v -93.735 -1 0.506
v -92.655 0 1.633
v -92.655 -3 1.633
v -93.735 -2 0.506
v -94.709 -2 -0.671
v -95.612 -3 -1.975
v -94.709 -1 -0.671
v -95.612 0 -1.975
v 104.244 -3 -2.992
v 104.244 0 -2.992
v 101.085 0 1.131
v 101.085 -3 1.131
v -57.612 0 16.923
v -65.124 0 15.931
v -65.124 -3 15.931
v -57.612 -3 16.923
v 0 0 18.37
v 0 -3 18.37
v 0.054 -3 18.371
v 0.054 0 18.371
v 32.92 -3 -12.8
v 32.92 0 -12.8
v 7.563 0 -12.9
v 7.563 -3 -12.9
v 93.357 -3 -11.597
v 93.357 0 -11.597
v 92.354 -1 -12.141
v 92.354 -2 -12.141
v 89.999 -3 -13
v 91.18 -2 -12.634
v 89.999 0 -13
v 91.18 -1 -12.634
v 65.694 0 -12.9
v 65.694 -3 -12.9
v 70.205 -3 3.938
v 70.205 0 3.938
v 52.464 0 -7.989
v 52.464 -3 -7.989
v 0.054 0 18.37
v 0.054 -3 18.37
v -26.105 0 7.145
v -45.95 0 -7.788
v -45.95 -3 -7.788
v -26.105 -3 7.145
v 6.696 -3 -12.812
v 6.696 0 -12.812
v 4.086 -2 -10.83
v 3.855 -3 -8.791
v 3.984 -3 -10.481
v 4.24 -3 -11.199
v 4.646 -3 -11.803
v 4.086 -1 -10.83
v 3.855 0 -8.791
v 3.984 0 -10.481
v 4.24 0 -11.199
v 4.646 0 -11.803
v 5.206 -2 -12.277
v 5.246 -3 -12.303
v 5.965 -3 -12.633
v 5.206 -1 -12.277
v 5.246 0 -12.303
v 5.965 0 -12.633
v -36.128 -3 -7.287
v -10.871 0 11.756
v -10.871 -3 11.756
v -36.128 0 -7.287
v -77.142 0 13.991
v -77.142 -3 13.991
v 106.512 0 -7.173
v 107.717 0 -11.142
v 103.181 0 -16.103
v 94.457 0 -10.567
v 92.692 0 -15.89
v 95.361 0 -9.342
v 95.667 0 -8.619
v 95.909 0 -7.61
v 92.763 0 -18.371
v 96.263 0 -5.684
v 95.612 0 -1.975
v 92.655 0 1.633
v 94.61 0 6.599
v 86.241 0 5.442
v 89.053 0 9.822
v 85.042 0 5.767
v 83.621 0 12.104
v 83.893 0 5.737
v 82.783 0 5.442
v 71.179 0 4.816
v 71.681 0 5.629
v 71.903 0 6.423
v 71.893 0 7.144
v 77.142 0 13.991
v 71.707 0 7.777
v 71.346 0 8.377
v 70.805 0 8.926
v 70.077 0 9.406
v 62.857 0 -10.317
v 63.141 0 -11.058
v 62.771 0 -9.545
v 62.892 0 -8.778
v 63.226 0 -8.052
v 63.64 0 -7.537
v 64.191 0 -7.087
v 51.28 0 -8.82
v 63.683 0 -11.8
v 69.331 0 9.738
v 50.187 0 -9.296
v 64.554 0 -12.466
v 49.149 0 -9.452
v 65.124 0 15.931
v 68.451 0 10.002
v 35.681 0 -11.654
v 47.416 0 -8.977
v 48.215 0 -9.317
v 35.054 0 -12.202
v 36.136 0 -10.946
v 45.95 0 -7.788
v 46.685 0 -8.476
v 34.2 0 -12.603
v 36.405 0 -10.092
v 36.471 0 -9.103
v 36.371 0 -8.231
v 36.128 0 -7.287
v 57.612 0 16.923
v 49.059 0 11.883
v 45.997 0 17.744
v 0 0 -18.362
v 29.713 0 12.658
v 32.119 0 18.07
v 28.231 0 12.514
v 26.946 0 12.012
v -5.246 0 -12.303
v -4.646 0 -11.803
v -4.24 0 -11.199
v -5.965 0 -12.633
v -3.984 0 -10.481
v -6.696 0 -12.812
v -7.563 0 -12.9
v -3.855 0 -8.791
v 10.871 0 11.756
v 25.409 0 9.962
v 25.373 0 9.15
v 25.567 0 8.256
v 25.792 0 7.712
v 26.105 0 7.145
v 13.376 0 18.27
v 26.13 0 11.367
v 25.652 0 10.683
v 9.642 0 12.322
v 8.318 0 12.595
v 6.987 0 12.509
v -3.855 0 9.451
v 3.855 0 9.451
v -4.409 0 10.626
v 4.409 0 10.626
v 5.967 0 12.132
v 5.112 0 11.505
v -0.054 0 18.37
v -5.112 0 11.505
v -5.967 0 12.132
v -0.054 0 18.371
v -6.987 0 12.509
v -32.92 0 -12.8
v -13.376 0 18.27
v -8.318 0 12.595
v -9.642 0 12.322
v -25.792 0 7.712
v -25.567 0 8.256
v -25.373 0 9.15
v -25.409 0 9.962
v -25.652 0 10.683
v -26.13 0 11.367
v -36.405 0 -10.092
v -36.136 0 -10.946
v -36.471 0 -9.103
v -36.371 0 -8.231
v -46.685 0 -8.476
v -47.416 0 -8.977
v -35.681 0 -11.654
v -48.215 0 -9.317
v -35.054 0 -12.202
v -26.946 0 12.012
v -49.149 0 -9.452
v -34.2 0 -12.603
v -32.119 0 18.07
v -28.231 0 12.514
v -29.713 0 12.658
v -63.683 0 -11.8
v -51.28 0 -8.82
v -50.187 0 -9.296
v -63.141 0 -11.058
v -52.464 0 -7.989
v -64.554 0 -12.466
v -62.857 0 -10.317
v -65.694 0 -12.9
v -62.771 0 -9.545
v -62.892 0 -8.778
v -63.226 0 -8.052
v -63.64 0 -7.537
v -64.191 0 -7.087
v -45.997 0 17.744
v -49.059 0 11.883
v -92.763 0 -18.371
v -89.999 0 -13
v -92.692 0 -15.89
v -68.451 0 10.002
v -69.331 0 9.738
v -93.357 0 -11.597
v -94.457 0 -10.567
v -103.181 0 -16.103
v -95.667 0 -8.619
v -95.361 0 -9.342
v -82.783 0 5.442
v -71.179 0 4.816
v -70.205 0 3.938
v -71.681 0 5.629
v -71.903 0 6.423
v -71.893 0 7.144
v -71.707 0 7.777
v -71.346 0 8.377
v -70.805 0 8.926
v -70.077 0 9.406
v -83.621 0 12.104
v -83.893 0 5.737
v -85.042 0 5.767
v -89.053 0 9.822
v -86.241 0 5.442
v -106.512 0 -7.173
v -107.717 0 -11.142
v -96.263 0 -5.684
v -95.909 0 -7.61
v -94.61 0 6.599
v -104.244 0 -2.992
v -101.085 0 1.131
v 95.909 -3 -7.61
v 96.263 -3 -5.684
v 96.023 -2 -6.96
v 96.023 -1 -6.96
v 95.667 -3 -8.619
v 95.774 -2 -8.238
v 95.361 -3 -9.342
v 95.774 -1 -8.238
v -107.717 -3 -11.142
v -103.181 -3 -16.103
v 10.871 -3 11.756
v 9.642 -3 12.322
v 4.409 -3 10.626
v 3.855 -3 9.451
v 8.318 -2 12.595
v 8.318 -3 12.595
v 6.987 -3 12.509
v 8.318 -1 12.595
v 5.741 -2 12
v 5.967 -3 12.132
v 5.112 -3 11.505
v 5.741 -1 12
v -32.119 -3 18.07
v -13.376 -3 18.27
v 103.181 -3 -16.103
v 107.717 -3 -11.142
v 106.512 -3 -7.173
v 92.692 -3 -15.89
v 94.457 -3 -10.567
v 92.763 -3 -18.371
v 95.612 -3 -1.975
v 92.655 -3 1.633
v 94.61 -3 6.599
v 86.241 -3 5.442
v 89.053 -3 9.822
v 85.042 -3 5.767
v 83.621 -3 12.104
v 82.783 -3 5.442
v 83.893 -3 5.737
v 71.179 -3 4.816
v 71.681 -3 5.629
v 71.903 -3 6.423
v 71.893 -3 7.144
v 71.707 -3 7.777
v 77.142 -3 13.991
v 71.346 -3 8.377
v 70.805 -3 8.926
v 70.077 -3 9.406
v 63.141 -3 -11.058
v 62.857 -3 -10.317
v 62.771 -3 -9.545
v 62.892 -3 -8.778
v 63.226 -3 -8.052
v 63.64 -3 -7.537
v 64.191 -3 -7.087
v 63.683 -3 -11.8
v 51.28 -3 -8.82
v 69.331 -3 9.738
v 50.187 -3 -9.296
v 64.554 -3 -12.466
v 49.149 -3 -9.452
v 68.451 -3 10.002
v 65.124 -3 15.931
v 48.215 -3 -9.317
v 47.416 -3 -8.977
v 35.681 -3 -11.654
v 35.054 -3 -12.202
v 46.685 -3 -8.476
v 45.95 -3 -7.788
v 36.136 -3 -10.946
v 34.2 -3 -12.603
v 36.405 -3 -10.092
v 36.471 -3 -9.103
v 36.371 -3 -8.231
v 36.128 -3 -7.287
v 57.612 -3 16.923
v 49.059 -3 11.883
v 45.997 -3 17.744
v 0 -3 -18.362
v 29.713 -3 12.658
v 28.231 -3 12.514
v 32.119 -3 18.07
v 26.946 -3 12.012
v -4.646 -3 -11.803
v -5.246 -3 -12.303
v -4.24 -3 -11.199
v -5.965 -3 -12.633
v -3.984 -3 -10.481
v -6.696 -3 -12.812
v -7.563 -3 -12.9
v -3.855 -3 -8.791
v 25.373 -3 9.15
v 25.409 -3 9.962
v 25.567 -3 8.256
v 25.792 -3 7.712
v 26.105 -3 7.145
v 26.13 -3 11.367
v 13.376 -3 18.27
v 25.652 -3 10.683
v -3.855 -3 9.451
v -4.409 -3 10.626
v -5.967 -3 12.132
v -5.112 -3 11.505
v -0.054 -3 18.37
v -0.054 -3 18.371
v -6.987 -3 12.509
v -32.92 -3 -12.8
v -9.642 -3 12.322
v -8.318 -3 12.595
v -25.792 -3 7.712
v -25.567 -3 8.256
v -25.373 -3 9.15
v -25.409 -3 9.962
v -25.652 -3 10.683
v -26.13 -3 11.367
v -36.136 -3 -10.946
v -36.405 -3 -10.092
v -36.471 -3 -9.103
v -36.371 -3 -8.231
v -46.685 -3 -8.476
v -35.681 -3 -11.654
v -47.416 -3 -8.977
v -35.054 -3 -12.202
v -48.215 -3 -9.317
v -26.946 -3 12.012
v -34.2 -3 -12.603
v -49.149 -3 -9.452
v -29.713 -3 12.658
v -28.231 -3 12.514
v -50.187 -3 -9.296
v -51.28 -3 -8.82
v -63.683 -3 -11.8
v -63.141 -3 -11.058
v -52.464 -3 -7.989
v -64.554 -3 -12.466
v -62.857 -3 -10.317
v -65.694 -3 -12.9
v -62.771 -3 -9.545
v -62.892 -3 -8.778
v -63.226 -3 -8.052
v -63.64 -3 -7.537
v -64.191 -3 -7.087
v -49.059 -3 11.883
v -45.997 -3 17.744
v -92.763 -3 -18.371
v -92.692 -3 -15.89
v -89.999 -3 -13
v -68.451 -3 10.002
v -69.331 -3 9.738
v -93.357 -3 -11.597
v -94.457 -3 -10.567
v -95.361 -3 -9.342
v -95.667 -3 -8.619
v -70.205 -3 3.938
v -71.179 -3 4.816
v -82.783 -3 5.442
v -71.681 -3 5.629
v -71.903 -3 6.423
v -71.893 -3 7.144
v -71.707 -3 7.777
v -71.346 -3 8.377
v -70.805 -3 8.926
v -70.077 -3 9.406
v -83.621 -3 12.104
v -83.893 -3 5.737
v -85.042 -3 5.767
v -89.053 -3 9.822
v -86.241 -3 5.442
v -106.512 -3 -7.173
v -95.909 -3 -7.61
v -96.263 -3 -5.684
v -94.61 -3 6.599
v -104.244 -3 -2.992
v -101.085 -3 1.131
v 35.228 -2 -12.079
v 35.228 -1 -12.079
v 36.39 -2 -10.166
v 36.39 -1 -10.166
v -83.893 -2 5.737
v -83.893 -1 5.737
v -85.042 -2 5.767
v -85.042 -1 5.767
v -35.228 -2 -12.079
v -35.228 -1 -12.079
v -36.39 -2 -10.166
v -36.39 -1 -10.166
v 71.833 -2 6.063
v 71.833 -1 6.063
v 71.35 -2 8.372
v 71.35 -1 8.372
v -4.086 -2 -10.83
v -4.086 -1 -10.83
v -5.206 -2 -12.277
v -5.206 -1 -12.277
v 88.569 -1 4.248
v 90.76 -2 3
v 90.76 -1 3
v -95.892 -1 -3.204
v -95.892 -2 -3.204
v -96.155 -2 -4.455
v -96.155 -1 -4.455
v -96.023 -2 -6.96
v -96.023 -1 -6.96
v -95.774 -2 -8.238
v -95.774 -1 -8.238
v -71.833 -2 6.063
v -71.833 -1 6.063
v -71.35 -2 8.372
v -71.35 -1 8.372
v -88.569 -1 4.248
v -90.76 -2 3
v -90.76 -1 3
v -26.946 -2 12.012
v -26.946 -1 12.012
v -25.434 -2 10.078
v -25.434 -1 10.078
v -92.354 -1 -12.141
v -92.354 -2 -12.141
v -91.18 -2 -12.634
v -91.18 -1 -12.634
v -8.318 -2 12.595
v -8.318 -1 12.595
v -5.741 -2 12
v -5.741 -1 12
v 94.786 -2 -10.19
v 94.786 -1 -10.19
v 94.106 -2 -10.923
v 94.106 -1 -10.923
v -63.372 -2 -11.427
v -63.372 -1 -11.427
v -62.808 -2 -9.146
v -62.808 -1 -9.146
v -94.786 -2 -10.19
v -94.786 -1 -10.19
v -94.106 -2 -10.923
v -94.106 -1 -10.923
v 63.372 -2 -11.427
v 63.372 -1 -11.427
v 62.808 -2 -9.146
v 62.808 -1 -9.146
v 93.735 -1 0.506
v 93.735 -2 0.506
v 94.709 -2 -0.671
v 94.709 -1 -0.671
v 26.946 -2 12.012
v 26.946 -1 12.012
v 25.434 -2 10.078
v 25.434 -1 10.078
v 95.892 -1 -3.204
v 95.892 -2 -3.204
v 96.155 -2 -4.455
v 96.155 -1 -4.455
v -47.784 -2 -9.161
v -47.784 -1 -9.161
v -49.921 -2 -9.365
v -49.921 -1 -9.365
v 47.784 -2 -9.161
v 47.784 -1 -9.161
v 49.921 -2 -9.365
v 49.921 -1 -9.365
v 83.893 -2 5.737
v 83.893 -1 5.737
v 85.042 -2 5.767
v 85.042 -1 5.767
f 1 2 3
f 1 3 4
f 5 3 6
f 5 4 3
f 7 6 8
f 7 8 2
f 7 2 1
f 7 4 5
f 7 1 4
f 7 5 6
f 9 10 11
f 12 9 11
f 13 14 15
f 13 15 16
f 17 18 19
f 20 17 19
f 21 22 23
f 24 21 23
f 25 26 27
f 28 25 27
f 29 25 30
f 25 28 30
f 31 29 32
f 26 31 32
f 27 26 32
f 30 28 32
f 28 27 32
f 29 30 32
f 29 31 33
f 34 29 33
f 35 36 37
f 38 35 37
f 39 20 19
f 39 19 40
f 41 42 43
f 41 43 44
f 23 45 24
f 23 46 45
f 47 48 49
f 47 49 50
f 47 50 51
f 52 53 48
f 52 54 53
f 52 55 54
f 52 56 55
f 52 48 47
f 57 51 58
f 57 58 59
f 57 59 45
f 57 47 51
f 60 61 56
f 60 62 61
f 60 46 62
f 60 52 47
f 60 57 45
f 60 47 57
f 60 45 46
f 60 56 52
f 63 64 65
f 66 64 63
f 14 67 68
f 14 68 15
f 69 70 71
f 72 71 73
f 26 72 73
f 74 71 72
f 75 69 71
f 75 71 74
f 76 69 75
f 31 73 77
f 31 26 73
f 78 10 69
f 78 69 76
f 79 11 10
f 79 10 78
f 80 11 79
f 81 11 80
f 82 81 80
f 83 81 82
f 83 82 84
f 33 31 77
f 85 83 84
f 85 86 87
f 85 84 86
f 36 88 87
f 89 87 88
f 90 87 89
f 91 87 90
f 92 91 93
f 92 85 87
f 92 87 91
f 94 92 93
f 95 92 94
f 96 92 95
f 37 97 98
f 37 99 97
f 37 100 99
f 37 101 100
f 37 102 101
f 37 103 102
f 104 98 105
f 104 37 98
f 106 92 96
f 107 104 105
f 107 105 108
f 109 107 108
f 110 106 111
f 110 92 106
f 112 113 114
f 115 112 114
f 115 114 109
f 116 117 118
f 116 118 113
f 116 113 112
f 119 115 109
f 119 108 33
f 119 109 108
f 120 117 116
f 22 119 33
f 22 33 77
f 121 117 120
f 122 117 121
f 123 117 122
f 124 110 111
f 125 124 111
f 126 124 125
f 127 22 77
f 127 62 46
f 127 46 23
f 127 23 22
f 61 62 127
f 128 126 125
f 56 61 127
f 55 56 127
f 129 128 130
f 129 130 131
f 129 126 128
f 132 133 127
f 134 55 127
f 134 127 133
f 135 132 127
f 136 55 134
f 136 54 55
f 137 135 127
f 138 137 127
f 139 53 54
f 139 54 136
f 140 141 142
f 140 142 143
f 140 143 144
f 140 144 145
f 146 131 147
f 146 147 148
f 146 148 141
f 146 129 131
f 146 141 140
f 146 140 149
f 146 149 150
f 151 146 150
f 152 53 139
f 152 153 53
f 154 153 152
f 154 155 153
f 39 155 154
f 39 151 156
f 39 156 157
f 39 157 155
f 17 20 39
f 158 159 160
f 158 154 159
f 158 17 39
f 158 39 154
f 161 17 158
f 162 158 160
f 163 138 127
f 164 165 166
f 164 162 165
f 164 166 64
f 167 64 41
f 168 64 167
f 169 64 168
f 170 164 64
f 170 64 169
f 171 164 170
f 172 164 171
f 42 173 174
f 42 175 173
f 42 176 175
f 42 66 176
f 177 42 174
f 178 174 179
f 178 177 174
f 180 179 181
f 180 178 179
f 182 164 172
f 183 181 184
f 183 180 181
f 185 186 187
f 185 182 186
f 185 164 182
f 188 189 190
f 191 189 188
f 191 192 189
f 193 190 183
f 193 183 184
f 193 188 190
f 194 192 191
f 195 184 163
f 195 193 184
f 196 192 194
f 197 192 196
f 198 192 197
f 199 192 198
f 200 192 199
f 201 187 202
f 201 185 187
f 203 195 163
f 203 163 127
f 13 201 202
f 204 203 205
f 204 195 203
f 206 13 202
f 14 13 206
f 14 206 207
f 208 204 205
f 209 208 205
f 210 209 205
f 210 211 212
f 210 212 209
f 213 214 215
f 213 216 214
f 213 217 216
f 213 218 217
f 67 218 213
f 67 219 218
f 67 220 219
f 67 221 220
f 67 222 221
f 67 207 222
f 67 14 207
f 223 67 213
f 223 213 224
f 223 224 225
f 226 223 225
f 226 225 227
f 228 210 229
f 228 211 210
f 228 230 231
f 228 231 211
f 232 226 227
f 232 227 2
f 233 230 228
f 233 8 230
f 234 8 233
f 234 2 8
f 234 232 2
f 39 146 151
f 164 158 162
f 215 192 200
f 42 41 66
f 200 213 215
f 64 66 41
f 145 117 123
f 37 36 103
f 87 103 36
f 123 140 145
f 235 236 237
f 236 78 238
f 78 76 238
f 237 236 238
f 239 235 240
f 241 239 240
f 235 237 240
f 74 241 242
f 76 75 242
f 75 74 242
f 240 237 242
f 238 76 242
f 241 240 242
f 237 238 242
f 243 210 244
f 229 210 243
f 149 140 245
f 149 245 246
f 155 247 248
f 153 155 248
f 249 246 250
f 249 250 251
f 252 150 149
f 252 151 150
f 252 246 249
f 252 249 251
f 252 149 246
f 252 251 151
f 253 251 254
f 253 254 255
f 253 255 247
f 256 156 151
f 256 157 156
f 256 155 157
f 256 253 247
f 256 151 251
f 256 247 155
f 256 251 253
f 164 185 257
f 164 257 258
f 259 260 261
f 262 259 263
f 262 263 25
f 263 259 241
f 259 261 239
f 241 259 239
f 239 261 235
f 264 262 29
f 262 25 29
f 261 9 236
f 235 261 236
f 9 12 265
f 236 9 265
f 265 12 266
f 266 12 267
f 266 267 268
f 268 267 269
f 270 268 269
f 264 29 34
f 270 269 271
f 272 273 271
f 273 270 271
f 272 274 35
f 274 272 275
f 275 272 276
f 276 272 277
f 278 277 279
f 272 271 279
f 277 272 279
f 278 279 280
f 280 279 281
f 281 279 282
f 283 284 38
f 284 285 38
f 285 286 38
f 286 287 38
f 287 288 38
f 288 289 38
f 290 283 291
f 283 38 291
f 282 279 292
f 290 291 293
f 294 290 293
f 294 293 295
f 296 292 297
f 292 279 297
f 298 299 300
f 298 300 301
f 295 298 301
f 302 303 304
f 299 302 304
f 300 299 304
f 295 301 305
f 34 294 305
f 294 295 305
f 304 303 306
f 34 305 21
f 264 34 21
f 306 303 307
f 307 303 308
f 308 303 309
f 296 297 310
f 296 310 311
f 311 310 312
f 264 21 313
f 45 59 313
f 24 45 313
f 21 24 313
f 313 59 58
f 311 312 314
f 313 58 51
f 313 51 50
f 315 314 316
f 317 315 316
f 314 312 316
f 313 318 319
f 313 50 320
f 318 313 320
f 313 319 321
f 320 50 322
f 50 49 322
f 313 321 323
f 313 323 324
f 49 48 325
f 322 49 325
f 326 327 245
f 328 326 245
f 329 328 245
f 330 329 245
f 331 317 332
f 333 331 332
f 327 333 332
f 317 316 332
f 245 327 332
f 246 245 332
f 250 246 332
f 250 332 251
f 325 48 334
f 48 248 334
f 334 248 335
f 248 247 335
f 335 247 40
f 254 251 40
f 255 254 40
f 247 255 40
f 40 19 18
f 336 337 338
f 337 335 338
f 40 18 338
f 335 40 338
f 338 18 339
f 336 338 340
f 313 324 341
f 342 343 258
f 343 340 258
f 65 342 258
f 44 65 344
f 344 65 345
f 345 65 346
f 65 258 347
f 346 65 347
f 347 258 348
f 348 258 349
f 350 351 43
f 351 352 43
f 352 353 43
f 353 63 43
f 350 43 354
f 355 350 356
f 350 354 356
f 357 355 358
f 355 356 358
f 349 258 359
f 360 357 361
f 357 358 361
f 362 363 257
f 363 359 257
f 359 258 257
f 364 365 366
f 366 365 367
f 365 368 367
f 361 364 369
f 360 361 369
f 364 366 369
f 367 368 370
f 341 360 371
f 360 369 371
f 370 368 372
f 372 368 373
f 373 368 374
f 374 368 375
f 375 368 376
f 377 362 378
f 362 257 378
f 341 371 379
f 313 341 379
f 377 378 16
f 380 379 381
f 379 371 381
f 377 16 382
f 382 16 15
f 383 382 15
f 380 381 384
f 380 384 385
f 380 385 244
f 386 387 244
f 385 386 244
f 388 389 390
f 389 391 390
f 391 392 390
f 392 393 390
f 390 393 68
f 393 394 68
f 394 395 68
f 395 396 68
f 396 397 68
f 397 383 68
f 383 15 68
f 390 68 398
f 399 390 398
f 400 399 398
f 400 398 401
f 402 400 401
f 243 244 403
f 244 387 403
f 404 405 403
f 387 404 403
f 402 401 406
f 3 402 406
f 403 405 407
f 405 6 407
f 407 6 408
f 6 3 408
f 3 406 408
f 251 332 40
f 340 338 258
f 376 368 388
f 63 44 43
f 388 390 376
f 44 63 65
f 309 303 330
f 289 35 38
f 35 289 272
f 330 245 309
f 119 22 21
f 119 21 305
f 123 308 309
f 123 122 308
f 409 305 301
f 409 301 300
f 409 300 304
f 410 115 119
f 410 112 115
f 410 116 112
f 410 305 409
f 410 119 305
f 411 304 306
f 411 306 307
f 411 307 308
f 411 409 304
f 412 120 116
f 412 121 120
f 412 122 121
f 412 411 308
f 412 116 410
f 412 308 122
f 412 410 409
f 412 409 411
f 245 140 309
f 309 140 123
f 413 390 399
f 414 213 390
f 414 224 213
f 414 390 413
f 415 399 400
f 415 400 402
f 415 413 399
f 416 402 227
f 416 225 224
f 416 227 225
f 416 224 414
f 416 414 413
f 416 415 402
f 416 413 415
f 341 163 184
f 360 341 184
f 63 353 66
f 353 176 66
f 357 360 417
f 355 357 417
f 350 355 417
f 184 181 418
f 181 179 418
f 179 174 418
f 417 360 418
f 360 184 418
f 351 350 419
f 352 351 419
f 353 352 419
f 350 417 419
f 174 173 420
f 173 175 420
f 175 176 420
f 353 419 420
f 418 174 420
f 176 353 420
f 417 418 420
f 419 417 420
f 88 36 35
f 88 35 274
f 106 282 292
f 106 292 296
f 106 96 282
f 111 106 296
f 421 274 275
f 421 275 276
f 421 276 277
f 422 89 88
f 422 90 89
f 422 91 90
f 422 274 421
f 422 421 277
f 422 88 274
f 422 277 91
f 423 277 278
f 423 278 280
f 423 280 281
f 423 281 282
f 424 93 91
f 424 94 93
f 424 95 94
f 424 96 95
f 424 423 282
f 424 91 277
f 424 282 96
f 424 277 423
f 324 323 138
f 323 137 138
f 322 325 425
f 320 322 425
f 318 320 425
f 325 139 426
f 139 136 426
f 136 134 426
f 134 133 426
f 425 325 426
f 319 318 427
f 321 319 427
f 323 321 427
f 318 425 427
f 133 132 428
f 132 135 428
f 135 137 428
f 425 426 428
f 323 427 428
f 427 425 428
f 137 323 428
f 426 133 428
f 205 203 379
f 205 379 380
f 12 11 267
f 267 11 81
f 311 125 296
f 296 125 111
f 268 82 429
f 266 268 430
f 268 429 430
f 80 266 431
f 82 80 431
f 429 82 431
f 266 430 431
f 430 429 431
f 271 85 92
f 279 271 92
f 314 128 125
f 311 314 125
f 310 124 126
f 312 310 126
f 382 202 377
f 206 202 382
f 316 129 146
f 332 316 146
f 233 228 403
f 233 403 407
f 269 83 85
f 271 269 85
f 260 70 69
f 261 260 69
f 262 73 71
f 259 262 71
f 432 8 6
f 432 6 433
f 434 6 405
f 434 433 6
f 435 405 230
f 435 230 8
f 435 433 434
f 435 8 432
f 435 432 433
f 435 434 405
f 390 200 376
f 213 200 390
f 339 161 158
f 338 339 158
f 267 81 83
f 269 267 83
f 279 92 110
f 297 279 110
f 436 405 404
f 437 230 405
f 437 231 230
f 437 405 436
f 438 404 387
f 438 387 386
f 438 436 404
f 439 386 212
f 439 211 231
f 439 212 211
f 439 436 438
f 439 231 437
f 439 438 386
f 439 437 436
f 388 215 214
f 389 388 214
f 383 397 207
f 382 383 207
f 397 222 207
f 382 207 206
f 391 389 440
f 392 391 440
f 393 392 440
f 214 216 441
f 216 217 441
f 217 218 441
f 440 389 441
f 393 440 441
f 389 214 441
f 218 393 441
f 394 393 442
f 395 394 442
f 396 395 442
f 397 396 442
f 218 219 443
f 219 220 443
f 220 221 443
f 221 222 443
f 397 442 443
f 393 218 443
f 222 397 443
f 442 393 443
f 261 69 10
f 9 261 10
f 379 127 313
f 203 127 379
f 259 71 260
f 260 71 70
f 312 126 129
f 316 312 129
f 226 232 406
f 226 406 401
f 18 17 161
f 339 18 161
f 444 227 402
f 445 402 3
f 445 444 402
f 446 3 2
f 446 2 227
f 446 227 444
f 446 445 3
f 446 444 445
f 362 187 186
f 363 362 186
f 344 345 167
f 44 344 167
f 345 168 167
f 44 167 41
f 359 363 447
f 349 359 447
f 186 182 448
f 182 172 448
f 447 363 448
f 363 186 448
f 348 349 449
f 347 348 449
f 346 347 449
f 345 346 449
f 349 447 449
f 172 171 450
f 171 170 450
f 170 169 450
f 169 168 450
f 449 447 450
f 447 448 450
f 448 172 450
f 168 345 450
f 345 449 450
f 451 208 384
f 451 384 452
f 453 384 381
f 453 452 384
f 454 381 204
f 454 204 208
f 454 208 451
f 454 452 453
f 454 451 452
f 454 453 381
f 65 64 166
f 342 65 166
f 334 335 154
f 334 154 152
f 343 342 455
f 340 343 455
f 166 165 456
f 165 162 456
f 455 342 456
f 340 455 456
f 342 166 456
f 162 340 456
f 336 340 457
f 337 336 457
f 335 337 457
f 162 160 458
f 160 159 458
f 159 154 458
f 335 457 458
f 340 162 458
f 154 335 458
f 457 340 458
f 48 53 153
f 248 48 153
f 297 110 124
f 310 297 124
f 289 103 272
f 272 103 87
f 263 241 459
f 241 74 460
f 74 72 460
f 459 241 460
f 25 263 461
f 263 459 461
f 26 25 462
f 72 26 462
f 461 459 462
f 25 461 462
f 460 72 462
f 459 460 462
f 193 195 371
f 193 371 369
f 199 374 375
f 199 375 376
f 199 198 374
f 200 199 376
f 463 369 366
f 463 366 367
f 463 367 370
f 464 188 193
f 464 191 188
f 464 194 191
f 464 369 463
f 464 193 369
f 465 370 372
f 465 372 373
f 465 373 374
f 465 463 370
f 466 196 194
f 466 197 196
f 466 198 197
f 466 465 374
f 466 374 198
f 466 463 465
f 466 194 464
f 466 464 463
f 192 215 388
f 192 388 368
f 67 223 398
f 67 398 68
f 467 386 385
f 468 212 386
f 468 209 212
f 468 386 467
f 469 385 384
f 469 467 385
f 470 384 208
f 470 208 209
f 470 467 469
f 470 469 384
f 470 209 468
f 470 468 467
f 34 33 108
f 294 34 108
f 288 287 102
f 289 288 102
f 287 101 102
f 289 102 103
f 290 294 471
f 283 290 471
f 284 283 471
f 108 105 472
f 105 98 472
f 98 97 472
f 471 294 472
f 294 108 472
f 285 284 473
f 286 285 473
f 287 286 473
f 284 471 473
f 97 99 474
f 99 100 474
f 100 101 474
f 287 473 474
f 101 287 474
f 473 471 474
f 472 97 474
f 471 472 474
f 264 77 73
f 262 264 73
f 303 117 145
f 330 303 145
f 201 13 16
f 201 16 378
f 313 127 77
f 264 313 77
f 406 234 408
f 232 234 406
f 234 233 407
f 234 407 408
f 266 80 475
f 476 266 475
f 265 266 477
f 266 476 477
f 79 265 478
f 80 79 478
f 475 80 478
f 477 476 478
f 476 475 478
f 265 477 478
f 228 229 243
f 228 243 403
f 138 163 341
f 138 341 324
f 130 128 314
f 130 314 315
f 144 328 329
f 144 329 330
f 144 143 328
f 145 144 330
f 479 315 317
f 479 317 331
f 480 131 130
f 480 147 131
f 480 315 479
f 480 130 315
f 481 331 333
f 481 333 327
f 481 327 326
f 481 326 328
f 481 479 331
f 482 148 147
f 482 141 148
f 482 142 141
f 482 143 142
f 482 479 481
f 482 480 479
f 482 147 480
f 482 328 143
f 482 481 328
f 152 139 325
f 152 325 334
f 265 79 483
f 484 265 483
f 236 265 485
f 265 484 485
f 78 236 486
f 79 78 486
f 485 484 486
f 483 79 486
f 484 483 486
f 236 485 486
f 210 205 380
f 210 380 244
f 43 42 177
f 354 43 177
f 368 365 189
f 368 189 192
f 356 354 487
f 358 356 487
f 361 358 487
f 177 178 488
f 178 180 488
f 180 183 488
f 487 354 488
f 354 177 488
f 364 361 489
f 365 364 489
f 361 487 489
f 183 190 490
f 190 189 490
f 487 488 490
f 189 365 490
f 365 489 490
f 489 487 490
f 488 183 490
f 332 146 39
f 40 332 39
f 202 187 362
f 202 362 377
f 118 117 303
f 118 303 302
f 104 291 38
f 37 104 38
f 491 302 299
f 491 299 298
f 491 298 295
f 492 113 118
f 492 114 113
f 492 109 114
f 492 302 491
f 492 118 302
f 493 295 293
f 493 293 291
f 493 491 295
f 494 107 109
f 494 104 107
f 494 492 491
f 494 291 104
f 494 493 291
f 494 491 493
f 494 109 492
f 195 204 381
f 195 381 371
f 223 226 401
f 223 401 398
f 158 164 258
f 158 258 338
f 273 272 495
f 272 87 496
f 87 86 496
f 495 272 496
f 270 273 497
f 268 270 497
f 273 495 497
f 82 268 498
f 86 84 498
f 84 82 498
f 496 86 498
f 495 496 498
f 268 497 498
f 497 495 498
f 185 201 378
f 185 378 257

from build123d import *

# Parameters (mm, degrees)
F1_DEPTH = 3


# Not quite as in the source:
# - ends of sketch curves that miss each other by under 0.0002 mm in the source are joined


with BuildPart() as f1:
    # F0 (on Front) → F1 (new body)
    with BuildSketch(Plane.XZ):
        Polygon((-0.0539638903, 18.370702), (-0.0038508903, -18.362152), (92.7633391097, -18.370702), (92.6924631097, -15.890233), (103.1813041097, -16.102845), (107.7170111097, -11.141907), (106.5122111097, -7.173158), (104.2443611097, -2.991796), (101.0845361097, 1.130854), (94.6101381097, 6.599435), (89.0528781097, 9.821526), (83.6210411097, 12.103627), (77.1418581097, 13.991338), (65.1238321097, 15.930635), (57.6115531097, 16.922822), (45.9973841097, 17.743913), (32.1186031097, 18.070024), (13.3763291097, 18.270477), align=None)
        with BuildLine():
            add(Edge.make_bspline(
                [(65.6943371097, -12.899831), (62.5550341097, -12.172951), (61.7713101097, -8.692501), (64.1909471097, -7.08672)],
                knots=[0, 0, 0, 0, 1, 1, 1, 1], degree=3))
            Line((64.1909471097, -7.08672), (82.7828791097, 5.441539))
            add(Edge.make_bspline(
                [(82.7828791097, 5.441539), (83.8783131097, 5.841711), (85.0121781097, 5.972881), (86.2406861097, 5.441541)],
                knots=[0, 0, 0, 0, 1, 1, 1, 1], degree=3))
            add(Edge.make_bspline(
                [(86.2406861097, 5.441541), (88.5854111097, 4.25464), (90.9595961097, 3.079519), (92.6551511097, 1.632949)],
                knots=[0, 0, 0, 0, 1, 1, 1, 1], degree=3))
            add(Edge.make_bspline(
                [(92.6551511097, 1.632949), (93.7989981097, 0.505006), (94.7332961097, -0.581922), (95.6118231097, -1.97519)],
                knots=[0, 0, 0, 0, 1, 1, 1, 1], degree=3))
            add(Edge.make_bspline(
                [(95.6118231097, -1.97519), (95.8557461097, -3.177903), (96.2772981097, -4.480841), (96.2632881097, -5.683554)],
                knots=[0, 0, 0, 0, 1, 1, 1, 1], degree=3))
            add(Edge.make_bspline(
                [(96.2632881097, -5.683554), (95.9762411097, -6.899896), (95.9073311097, -8.384491), (95.3612561097, -9.341805)],
                knots=[0, 0, 0, 0, 1, 1, 1, 1], degree=3))
            add(Edge.make_bspline(
                [(95.3612561097, -9.341805), (94.8500481097, -10.267174), (94.1296281097, -10.933218), (93.3567311097, -11.596892)],
                knots=[0, 0, 0, 0, 1, 1, 1, 1], degree=3))
            add(Edge.make_bspline(
                [(93.3567311097, -11.596892), (92.4958131097, -12.139141), (91.1271531097, -12.72489), (89.9991611097, -13.000059)],
                knots=[0, 0, 0, 0, 1, 1, 1, 1], degree=3))
            Line((89.9991611097, -13.000059), (65.6943371097, -12.899831))
        make_face(mode=Mode.SUBTRACT)
        with BuildLine():
            Line((3.8548531097, -8.790562), (3.8548531097, 9.450582))
            add(Edge.make_bspline(
                [(10.8706771097, 11.755782), (8.5680291097, 13.13931), (5.1563371097, 13.150107), (3.8548531097, 9.450582)],
                knots=[0, 0, 0, 0, 1, 1, 1, 1], degree=3))
            Line((10.8706771097, 11.755782), (36.1276481097, -7.28717))
            add(Edge.make_bspline(
                [(32.9204121097, -12.799606), (35.7071221097, -12.751328), (37.1961481097, -10.572453), (36.1276481097, -7.28717)],
                knots=[0, 0, 0, 0, 1, 1, 1, 1], degree=3))
            Line((32.9204121097, -12.799606), (7.5632171097, -12.899831))
            add(Edge.make_bspline(
                [(3.8548531097, -8.790562), (3.7573371097, -11.04941), (4.4717691097, -12.766958), (7.5632171097, -12.899831)],
                knots=[0, 0, 0, 0, 1, 1, 1, 1], degree=3))
        make_face(mode=Mode.SUBTRACT)
        with BuildLine():
            Line((45.9498021097, -7.788301), (26.1050401097, 7.145382))
            add(Edge.make_bspline(
                [(29.7131791097, 12.657816), (26.6289141097, 12.752098), (24.0319891097, 10.480568), (26.1050401097, 7.145382)],
                knots=[0, 0, 0, 0, 1, 1, 1, 1], degree=3))
            Line((29.7131791097, 12.657816), (49.0586381097, 11.882658))
            Line((49.0586381097, 11.882658), (68.4505551097, 10.001826))
            add(Edge.make_bspline(
                [(70.2045121097, 3.938149), (72.7849811097, 5.68209), (72.6619441097, 8.999483), (68.4505551097, 10.001826)],
                knots=[0, 0, 0, 0, 1, 1, 1, 1], degree=3))
            Line((70.2045121097, 3.938149), (52.4644981097, -7.988753))
            add(Edge.make_bspline(
                [(45.9498021097, -7.788301), (47.6692371097, -9.607126), (49.6811001097, -10.292787), (52.4644981097, -7.988753)],
                knots=[0, 0, 0, 0, 1, 1, 1, 1], degree=3))
        make_face(mode=Mode.SUBTRACT)
    extrude(amount=F1_DEPTH)

    # F2: F1 across plane


with BuildPart() as f1_1:
    add(f1.part)
    add(f1.part.mirror(Plane.YZ))


solid = f1_1.part
